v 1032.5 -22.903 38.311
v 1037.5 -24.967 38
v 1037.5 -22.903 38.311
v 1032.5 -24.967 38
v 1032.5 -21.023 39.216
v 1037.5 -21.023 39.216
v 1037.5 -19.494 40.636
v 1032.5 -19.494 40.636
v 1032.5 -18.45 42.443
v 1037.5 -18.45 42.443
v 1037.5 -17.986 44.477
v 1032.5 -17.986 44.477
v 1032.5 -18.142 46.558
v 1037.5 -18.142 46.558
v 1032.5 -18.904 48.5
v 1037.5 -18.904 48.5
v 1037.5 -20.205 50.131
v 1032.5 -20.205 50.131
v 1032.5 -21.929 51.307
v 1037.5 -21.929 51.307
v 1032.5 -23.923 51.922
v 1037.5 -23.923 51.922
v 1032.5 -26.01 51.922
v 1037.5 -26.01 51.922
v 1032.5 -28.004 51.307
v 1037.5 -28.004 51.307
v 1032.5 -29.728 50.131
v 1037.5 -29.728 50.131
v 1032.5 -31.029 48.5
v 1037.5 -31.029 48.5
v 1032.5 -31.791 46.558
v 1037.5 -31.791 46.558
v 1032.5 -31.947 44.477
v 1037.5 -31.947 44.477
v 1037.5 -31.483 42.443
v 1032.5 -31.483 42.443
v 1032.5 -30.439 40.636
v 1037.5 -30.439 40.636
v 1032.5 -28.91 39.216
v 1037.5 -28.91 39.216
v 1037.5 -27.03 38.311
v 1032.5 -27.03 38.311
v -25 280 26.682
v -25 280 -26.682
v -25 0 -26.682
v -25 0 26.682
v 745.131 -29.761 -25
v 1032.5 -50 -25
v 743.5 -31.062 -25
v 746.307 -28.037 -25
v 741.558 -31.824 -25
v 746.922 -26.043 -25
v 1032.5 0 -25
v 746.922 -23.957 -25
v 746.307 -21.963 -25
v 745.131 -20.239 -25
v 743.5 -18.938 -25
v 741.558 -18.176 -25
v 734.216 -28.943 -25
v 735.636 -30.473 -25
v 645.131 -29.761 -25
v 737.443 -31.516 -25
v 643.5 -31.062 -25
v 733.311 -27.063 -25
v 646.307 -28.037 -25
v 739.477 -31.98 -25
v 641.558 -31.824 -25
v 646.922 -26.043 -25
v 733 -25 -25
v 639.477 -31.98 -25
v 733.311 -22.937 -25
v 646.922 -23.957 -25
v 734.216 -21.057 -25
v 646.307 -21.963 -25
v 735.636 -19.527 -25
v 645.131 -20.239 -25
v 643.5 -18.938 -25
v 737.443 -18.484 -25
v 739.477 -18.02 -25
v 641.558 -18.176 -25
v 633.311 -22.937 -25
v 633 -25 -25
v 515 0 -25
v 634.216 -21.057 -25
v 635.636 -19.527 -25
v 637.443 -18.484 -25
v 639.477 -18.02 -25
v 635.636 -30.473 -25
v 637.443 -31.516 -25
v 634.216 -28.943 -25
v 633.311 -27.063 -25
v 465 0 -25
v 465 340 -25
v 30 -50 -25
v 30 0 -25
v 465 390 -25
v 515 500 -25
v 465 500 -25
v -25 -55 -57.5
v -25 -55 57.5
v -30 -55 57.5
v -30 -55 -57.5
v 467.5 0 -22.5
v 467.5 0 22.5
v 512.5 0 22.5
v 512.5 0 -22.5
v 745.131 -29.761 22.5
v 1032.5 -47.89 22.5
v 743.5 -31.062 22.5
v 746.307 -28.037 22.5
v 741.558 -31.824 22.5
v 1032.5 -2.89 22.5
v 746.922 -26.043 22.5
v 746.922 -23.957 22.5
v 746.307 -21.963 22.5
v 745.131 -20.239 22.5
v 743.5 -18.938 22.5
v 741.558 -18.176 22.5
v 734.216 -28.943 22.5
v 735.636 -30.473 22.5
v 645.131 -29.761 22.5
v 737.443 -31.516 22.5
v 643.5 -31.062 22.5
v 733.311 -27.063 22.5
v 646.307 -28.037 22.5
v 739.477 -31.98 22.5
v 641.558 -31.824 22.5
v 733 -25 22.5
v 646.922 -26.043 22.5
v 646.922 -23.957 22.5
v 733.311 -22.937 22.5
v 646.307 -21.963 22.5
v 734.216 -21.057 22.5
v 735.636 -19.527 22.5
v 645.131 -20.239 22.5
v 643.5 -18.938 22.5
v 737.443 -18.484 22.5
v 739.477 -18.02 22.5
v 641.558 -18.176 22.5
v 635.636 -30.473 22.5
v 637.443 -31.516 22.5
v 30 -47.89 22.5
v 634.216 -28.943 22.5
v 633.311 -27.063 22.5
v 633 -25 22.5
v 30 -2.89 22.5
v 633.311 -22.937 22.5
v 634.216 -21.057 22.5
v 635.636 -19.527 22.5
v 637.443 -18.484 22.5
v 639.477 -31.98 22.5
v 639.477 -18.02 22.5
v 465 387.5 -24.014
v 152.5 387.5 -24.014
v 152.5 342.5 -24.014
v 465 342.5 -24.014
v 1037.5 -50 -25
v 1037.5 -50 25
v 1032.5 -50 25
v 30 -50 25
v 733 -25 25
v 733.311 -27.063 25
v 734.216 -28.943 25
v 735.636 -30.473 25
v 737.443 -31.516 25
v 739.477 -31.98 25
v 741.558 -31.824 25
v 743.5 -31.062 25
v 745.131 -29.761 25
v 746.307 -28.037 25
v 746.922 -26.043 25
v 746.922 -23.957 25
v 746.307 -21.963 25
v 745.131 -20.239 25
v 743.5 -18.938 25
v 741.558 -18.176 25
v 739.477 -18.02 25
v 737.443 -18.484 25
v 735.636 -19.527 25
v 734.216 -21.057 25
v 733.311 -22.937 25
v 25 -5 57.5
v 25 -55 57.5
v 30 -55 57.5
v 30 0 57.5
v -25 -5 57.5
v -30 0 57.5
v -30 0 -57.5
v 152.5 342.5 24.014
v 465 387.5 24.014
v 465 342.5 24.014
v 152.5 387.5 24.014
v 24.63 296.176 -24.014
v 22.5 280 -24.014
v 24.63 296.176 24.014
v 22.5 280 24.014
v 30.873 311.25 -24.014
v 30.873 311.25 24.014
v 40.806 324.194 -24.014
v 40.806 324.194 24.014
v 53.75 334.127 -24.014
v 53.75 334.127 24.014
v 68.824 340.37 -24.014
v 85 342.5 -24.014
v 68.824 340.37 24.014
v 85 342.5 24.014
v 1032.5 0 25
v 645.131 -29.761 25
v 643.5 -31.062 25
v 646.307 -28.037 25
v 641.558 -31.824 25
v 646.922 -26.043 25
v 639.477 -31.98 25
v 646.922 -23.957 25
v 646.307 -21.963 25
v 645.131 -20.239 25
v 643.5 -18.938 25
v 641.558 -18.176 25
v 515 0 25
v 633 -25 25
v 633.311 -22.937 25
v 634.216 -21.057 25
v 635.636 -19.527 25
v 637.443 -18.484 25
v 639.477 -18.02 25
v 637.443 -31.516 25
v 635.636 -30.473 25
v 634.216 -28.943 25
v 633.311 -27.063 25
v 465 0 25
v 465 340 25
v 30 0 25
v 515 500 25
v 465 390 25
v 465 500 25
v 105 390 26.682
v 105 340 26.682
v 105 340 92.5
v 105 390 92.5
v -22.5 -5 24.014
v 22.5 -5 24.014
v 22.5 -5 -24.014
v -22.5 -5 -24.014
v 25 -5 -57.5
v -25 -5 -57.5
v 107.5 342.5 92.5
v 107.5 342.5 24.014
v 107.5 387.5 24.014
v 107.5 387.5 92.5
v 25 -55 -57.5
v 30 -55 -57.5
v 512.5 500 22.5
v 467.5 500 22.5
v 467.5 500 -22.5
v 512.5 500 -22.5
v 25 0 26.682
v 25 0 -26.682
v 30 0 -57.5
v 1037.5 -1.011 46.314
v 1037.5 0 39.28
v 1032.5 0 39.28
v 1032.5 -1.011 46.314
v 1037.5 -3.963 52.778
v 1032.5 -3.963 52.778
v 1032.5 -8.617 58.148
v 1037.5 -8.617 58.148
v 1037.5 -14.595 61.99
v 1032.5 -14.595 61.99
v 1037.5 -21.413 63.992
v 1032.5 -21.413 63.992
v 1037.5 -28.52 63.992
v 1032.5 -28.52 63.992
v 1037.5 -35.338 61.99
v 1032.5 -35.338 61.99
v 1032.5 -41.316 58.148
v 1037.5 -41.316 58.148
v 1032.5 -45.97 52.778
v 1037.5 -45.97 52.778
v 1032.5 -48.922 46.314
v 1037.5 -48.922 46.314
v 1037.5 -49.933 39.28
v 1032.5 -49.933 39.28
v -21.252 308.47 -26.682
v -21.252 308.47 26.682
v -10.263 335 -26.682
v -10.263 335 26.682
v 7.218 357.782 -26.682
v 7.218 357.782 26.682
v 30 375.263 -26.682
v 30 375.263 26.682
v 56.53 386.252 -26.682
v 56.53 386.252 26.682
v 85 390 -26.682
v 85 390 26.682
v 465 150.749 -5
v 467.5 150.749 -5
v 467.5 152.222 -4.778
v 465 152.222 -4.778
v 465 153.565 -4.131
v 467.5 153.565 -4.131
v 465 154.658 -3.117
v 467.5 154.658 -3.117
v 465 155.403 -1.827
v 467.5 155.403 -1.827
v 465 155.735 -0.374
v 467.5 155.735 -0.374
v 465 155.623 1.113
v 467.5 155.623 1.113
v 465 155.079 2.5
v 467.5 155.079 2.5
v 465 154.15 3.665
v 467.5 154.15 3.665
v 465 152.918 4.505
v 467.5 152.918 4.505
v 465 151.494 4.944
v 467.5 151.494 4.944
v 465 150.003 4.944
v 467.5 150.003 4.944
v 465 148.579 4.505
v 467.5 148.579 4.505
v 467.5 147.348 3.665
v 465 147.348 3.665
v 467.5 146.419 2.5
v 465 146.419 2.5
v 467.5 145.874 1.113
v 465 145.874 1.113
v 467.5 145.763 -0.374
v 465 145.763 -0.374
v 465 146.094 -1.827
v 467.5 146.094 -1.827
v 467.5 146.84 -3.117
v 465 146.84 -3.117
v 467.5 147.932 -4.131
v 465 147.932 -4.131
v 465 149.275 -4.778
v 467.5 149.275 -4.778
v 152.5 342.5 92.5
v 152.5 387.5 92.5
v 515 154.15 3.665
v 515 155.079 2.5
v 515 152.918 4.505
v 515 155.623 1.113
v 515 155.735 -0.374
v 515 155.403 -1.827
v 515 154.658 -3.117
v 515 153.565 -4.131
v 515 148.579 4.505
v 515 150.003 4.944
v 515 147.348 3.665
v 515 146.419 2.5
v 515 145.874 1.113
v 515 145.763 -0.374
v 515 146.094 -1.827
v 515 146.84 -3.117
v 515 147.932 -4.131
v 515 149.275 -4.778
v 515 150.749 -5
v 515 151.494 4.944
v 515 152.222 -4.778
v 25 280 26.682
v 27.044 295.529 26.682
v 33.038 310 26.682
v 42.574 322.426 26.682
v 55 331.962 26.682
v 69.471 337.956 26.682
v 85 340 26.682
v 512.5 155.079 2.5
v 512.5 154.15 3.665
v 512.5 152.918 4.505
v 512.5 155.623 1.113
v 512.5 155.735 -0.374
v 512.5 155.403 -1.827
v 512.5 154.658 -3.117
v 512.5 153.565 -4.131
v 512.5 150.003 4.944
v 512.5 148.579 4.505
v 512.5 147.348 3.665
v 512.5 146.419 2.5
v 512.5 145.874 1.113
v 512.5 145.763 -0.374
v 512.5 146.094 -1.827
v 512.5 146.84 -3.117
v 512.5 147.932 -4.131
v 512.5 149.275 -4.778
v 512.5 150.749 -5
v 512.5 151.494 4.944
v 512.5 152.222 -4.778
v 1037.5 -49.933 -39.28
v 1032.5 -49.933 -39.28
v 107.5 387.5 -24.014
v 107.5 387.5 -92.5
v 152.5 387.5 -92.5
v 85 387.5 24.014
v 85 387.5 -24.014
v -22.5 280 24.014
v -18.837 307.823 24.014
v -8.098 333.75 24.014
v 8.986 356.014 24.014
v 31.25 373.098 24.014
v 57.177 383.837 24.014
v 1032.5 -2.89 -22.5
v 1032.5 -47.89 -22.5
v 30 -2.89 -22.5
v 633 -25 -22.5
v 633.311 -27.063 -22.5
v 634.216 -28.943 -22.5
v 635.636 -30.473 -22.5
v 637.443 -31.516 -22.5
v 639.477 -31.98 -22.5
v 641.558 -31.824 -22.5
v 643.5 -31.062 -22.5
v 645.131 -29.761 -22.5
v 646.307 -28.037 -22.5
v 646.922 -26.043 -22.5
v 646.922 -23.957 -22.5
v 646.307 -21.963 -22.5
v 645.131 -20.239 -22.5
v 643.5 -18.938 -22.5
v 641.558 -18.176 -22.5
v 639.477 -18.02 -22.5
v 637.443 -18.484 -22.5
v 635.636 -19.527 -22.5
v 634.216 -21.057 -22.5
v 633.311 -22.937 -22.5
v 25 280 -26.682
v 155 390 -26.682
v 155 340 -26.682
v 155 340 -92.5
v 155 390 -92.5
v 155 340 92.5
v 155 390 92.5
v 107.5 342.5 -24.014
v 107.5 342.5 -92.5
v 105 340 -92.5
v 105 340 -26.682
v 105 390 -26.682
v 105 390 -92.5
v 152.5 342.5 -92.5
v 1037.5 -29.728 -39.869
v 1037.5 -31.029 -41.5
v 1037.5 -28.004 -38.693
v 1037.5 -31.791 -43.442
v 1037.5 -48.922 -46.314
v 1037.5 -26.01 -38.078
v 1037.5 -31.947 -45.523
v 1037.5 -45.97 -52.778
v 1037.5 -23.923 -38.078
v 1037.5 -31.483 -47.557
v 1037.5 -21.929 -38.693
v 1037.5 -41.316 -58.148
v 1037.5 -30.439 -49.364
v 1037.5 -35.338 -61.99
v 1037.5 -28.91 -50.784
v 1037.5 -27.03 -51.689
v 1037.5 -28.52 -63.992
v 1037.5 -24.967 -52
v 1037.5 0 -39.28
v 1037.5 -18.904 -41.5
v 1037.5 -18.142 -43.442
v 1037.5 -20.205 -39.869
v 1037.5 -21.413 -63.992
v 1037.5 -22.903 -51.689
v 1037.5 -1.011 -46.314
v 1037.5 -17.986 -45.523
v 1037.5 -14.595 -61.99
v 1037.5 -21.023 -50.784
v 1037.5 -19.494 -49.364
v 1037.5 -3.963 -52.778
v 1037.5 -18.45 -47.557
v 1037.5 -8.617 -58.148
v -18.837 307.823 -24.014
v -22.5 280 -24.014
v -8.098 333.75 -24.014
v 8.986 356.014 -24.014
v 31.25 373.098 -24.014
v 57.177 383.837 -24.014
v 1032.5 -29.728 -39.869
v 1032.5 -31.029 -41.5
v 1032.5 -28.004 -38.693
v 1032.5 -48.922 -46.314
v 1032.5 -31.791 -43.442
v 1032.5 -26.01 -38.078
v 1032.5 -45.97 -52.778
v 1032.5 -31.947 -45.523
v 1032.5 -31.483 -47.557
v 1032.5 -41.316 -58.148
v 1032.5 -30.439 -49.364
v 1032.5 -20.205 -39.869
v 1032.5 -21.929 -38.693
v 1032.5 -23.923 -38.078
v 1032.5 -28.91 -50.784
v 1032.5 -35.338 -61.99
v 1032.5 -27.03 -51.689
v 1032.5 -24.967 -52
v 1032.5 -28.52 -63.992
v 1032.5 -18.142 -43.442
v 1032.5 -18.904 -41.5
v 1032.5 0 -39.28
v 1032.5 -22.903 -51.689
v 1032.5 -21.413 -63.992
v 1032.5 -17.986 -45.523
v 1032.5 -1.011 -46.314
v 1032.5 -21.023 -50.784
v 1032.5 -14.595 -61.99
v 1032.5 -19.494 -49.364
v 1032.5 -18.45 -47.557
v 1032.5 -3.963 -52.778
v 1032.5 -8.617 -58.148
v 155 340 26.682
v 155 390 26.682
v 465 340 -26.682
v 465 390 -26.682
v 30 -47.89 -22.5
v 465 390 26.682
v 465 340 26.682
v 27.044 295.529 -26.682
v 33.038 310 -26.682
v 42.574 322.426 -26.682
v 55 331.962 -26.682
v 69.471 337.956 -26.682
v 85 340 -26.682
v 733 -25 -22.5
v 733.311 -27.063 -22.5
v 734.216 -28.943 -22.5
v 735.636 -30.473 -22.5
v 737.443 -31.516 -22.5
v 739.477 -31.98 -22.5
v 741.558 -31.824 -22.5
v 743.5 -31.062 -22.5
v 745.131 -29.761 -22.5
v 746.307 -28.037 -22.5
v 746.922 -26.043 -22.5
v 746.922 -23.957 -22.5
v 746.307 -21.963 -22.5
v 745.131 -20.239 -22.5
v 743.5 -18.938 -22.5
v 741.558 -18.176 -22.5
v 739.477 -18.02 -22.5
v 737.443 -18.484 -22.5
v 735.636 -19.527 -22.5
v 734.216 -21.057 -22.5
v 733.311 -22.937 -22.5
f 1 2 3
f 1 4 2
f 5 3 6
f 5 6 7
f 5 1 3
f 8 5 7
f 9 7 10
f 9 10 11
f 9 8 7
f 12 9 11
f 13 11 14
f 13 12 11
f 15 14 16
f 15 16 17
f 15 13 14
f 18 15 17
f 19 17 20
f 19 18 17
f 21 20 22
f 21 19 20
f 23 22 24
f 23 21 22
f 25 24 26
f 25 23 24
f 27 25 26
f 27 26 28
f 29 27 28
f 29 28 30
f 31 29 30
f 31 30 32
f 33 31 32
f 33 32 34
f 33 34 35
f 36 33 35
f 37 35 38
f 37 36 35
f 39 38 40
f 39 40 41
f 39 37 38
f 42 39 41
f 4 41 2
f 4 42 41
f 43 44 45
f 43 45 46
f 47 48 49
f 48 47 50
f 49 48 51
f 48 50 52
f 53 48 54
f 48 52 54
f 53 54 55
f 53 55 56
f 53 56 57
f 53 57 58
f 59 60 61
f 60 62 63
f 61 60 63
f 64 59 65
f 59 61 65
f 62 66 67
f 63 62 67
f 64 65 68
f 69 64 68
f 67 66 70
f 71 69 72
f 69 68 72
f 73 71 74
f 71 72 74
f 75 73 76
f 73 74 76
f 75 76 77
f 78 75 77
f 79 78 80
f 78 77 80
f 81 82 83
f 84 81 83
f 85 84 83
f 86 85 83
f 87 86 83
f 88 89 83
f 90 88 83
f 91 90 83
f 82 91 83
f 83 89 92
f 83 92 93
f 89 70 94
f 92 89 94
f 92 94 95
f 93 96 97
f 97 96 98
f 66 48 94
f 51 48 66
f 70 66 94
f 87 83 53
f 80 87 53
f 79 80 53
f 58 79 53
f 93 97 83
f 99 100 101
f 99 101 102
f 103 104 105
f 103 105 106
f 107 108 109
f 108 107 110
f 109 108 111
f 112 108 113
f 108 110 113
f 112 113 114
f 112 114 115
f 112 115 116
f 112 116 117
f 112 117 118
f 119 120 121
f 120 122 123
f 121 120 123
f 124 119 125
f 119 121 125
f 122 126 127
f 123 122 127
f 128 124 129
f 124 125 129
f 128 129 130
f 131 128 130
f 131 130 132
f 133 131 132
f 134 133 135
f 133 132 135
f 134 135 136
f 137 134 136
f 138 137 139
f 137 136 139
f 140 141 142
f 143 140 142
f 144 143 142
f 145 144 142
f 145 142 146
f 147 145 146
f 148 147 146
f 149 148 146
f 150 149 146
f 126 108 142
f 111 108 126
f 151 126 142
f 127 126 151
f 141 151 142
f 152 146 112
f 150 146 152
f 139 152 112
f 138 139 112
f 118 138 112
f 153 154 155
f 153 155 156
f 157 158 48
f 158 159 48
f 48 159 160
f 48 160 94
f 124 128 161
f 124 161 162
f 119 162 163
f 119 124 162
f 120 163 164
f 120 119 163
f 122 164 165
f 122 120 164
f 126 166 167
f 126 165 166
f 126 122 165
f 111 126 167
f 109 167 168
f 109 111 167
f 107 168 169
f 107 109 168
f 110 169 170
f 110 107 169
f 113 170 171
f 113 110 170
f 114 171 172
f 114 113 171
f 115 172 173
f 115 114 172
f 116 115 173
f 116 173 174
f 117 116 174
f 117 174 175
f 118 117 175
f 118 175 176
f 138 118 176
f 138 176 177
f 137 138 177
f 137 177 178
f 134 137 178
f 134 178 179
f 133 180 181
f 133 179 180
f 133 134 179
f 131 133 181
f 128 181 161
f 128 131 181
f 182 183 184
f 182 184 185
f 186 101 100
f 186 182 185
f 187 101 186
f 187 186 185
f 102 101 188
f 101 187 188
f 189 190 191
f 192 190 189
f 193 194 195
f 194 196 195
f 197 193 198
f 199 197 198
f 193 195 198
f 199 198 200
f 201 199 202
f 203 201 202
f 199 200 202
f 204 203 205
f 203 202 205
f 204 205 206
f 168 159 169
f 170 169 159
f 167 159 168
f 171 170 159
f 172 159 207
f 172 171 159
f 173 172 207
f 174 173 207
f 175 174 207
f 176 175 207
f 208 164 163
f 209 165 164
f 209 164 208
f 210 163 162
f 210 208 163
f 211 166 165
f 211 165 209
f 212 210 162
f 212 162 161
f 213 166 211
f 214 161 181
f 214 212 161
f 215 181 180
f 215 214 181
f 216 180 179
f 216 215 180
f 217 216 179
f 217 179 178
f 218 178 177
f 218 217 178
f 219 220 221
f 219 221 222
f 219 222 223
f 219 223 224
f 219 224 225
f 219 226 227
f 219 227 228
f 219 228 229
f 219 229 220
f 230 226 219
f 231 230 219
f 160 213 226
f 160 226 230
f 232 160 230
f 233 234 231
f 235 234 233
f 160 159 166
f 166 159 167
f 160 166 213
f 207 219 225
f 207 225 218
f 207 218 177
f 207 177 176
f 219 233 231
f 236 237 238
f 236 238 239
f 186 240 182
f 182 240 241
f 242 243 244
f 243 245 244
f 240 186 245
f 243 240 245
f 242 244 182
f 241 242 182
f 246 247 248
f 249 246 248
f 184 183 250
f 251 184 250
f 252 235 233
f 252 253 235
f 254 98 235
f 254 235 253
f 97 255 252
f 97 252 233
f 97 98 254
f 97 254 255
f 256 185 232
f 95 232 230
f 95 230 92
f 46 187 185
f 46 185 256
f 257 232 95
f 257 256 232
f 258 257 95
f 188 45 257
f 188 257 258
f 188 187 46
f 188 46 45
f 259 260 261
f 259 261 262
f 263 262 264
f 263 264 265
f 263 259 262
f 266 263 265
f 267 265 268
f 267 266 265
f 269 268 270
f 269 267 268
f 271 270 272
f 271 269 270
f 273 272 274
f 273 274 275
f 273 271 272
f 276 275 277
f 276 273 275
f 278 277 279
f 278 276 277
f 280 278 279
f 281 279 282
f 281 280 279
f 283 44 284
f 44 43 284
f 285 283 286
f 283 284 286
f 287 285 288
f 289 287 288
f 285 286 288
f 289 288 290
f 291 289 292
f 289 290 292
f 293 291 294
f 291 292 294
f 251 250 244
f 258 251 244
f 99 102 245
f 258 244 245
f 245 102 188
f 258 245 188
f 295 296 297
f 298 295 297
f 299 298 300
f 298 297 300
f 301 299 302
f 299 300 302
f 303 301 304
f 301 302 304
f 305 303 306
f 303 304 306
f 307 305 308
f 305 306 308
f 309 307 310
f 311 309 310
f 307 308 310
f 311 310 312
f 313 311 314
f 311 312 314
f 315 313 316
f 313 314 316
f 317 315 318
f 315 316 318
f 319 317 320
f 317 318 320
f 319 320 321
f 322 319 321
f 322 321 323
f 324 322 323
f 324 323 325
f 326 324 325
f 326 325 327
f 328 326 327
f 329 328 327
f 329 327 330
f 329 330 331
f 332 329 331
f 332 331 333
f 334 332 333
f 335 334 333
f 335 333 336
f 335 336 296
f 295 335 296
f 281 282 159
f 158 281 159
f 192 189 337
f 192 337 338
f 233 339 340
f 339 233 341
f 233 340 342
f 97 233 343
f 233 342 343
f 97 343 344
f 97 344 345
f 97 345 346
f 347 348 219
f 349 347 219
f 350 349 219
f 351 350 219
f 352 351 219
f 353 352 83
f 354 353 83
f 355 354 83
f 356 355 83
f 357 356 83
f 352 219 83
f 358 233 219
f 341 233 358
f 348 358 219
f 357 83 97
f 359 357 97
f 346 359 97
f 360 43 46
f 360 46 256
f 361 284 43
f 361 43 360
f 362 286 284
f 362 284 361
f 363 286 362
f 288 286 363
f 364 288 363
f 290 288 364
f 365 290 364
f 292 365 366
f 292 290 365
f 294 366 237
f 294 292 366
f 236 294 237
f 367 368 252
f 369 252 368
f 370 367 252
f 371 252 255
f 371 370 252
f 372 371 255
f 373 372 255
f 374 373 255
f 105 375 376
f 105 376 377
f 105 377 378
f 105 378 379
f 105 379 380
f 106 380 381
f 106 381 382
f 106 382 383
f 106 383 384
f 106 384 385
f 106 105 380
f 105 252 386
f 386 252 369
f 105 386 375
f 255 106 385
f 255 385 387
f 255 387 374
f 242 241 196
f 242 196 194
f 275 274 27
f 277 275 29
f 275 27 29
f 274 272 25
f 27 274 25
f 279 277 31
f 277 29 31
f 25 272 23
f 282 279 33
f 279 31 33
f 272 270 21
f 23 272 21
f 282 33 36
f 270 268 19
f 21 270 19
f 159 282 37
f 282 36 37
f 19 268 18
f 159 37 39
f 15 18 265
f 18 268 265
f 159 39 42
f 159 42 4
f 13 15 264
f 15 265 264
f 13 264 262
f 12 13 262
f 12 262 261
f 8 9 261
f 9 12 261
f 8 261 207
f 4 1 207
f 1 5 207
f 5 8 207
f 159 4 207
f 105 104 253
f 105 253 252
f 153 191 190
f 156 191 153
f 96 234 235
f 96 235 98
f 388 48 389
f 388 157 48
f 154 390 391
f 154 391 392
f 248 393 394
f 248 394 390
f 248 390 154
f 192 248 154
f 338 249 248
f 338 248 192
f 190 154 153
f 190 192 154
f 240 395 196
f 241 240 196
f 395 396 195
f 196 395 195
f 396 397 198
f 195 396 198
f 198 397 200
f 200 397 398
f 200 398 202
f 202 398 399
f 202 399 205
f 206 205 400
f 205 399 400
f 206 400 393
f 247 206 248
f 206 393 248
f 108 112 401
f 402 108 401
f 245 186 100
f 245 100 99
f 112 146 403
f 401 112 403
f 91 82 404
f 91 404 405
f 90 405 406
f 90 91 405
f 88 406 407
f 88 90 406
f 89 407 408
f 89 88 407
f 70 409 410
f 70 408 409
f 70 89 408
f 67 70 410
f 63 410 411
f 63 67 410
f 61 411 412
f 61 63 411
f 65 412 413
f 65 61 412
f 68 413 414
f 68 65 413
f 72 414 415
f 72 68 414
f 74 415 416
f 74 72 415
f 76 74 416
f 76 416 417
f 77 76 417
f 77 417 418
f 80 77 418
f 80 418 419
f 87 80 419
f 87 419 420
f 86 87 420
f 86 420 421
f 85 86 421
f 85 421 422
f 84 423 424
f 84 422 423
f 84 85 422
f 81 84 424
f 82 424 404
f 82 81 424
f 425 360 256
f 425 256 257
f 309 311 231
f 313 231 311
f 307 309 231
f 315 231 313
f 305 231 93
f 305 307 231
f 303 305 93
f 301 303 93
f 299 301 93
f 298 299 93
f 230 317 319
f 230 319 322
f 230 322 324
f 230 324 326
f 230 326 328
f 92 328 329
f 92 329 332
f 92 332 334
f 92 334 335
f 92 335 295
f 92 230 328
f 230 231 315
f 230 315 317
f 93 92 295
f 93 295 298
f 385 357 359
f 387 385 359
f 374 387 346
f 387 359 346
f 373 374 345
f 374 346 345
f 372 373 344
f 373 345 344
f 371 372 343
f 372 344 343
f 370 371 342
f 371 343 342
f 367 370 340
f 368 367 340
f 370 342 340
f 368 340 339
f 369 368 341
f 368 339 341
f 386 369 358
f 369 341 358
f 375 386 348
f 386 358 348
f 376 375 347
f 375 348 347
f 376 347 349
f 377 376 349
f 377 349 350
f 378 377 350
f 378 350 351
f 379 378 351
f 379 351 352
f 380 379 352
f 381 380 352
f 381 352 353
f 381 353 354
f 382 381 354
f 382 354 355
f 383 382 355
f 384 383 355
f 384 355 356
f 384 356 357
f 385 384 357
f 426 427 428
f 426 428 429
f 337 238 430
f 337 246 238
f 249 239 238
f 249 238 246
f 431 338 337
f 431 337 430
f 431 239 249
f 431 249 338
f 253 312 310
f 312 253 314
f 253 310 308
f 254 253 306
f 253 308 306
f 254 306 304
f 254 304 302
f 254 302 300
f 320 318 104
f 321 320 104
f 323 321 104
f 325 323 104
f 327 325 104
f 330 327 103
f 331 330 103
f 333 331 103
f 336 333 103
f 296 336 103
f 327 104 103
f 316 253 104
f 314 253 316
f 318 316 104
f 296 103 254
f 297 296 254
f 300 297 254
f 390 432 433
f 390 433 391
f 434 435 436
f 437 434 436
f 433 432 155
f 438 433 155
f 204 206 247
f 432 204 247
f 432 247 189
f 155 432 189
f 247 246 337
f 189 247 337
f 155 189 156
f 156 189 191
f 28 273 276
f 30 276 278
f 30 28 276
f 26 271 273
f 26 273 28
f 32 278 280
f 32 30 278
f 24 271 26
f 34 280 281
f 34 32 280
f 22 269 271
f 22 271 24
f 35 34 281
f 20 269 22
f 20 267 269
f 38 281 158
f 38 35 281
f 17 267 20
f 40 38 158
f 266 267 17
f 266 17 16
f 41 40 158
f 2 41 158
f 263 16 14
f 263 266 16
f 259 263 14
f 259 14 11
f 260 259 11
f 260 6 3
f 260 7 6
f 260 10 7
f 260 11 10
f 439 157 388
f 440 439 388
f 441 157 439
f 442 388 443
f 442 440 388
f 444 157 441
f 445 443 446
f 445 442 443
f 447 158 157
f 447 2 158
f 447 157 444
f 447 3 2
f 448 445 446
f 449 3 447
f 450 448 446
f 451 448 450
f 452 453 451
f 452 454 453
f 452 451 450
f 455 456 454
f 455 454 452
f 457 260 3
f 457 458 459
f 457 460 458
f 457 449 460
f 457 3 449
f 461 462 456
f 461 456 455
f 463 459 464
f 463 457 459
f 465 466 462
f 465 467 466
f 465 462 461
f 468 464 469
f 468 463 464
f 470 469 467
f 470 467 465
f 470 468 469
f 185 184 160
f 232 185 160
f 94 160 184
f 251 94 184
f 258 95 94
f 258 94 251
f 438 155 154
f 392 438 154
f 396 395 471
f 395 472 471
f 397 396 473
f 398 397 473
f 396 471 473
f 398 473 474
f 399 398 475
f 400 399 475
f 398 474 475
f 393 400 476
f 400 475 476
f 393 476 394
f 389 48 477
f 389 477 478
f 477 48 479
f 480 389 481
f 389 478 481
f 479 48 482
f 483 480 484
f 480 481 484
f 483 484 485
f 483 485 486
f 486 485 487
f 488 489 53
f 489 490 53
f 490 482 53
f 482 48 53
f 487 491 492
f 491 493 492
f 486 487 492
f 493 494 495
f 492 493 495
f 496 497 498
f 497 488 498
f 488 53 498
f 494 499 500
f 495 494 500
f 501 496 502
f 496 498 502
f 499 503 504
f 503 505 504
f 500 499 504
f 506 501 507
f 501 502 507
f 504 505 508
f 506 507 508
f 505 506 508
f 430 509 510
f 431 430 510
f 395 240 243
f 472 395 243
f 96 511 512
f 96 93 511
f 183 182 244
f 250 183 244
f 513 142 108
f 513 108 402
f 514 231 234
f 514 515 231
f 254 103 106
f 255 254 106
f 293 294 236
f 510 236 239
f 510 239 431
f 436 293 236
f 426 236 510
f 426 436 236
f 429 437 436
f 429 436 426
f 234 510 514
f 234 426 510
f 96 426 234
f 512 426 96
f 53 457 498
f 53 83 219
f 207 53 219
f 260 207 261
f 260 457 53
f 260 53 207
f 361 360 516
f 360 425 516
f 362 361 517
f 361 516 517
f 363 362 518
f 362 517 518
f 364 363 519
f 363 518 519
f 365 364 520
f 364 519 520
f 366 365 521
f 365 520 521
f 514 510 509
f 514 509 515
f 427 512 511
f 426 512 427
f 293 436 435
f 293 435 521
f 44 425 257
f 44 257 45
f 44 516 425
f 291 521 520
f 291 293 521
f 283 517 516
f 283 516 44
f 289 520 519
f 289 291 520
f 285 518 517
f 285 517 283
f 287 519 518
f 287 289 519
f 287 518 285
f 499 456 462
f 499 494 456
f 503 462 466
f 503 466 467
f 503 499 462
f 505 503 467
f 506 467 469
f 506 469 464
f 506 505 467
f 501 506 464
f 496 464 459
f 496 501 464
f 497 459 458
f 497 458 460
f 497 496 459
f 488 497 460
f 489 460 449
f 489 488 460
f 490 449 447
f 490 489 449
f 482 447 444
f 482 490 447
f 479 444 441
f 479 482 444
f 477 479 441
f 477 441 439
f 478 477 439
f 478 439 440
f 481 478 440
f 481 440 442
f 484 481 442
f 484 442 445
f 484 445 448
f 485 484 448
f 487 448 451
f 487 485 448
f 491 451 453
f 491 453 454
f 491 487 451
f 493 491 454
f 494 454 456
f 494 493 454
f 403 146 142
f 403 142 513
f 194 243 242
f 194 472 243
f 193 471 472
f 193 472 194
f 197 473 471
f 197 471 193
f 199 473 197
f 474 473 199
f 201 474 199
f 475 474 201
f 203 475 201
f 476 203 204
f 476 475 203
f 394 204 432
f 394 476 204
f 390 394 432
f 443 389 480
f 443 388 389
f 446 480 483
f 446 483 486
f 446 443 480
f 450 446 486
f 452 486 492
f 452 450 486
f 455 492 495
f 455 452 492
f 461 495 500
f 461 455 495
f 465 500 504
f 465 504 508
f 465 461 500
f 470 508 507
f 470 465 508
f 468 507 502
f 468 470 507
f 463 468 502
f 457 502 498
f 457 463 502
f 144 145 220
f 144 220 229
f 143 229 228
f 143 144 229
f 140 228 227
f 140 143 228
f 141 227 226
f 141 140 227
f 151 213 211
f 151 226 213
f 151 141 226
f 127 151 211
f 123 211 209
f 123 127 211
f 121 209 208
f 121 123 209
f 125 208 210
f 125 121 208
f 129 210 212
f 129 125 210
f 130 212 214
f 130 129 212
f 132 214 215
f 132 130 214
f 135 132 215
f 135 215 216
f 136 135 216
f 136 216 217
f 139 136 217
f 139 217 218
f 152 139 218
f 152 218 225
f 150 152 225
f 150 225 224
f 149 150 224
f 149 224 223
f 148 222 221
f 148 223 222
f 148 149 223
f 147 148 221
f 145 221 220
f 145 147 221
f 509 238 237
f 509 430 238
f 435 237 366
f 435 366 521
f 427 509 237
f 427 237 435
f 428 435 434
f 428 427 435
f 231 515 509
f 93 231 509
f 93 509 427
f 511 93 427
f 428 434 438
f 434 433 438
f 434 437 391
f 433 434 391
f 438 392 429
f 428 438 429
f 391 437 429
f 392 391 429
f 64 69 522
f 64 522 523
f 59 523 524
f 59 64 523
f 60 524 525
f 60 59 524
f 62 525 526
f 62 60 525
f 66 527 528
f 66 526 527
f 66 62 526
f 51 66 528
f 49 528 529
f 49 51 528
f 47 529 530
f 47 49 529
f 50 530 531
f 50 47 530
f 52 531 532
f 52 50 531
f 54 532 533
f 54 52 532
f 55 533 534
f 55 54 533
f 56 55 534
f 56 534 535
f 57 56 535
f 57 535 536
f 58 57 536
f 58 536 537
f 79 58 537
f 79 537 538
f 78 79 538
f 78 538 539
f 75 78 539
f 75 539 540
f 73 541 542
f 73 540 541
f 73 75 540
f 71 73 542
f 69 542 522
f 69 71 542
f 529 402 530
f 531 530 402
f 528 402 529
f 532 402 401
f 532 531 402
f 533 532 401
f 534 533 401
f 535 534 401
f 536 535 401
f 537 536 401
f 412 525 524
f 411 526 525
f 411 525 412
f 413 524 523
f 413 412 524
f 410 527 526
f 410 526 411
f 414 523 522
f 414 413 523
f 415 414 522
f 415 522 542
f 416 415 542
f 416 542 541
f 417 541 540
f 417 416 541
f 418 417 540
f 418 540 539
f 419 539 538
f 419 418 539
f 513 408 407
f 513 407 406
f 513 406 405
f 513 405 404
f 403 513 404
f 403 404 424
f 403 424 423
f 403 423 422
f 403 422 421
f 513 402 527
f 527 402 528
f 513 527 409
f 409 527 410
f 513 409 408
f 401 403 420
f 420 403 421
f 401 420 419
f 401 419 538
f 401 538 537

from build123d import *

# Parameters (mm, degrees)
SKETCH3_W               = 50
SKETCH3_H               = 53.36450452
SKETCH3_W_2             = 45
SKETCH3_H_2             = 48.028054068
SKETCH6_W               = 50
SKETCH6_H               = 50
SKETCH6_W_2             = 45
SKETCH6_H_2             = 45
BOSS_EXTRUDE1_DEPTH     = 67.5
SKETCH8_W               = 50
SKETCH8_H               = 50
SKETCH8_W_2             = 45
SKETCH8_H_2             = 45
BOSS_EXTRUDE2_DEPTH     = 500
CUT_EXTRUDE1_DEPTH      = 728.345344386
CUT_EXTRUDE1_DEPTH_BACK = 728.345344386
SKETCH9_W               = 45
SKETCH9_H               = 45
SKETCH12_W              = 60
SKETCH12_H              = 115
SKETCH12_W_2            = 45
SKETCH12_H_2            = 48.028054068
BOSS_EXTRUDE6_DEPTH     = 5
SKETCH14_W              = 115
SKETCH14_H              = 55
BOSS_EXTRUDE7_DEPTH     = 5
SKETCH15_W              = 50
SKETCH15_H              = 50
SKETCH15_W_2            = 45
SKETCH15_H_2            = 45
BOSS_EXTRUDE8_DEPTH     = 1005
CUT_EXTRUDE3_DEPTH      = 1156.435523948
CUT_EXTRUDE3_DEPTH_BACK = 1156.435523948
SKETCH18_R              = 7
SKETCH19_R              = 7
BOSS_EXTRUDE9_DEPTH     = 2.5
CUT_EXTRUDE4_REACH      = 747.373
SKETCH20_R              = 5


with BuildPart() as part:
    # Sweep1: sweep along a path in Sketch1
    with BuildLine(Plane.XY) as sweep1_path:
        Line((0, 0), (0, 280))
        ThreePointArc((0, 280), (24.895923599, 340.104076401), (85, 365))
        Line((85, 365), (465, 365))
    # Sketch3 → Sweep1 (sweep)
    with BuildSketch(Plane(origin=(0, 0, 0), x_dir=(1, 0, 0), z_dir=(0, 1, 0))):
        Rectangle(SKETCH3_W, SKETCH3_H)
        Rectangle(SKETCH3_W_2, SKETCH3_H_2, mode=Mode.SUBTRACT)
    sweep(path=sweep1_path.line)

    # Sketch6 → Boss-Extrude1 (add)
    with BuildSketch(Plane.XY.offset(-25)):
        with Locations((130, 365)):
            Rectangle(SKETCH6_W, SKETCH6_H)
        with Locations((130, 365)):
            Rectangle(SKETCH6_W_2, SKETCH6_H_2, mode=Mode.SUBTRACT)
    boss_extrude1 = extrude(amount=-BOSS_EXTRUDE1_DEPTH)

    # Mirror1: Boss-Extrude1 across plane
    add(boss_extrude1.mirror(Plane.XY))

    # Sketch8 → Boss-Extrude2 (add)
    with BuildSketch(Plane(origin=(0, 0, 0), x_dir=(1, 0, 0), z_dir=(0, 1, 0))):
        with Locations((490, 0)):
            Rectangle(SKETCH8_W, SKETCH8_H)
        with Locations((490, 0)):
            Rectangle(SKETCH8_W_2, SKETCH8_H_2, mode=Mode.SUBTRACT)
    extrude(amount=BOSS_EXTRUDE2_DEPTH)

    # Sketch9 → Cut-Extrude1 (cut, two sides: drawn at the far end of the back side and taken through both)
    with BuildSketch(Plane.XY.offset(25).offset(-CUT_EXTRUDE1_DEPTH_BACK)):
        with Locations((130, 365)):
            Rectangle(SKETCH9_W, SKETCH9_H)
    extrude(amount=CUT_EXTRUDE1_DEPTH + CUT_EXTRUDE1_DEPTH_BACK, mode=Mode.SUBTRACT)

    # Sketch12 → Boss-Extrude6 (add)
    with BuildSketch(Plane(origin=(0, 0, 0), x_dir=(1, 0, 0), z_dir=(0, 1, 0))):
        Rectangle(SKETCH12_W, SKETCH12_H)
        Rectangle(SKETCH12_W_2, SKETCH12_H_2, mode=Mode.SUBTRACT)
    extrude(amount=-BOSS_EXTRUDE6_DEPTH)

    # Sketch14 → Boss-Extrude7 (add)
    with BuildSketch(Plane(origin=(-25, 0, 0), x_dir=(0, 0, -1), z_dir=(1, 0, 0))):
        with Locations((0, -27.5)):
            Rectangle(SKETCH14_W, SKETCH14_H)
    boss_extrude7 = extrude(amount=-BOSS_EXTRUDE7_DEPTH)

    # Mirror2: Boss-Extrude7 across plane
    add(boss_extrude7.mirror(Plane(origin=(0, 0, 0), x_dir=(0, 0, 1), z_dir=(1, 0, 0))))

    # Sketch15 → Boss-Extrude8 (add)
    with BuildSketch(Plane(origin=(30, 0, 0), x_dir=(0, 0, -1), z_dir=(1, 0, 0))):
        with Locations((0, -25)):
            Rectangle(SKETCH15_W, SKETCH15_H)
        with Locations((0, -25.38965636)):
            Rectangle(SKETCH15_W_2, SKETCH15_H_2, mode=Mode.SUBTRACT)
    extrude(amount=BOSS_EXTRUDE8_DEPTH)

    # Sketch18 → Cut-Extrude3 (cut, two sides: drawn at the far end of the back side and taken through both)
    with BuildSketch(Plane.XY.offset(25).offset(-CUT_EXTRUDE3_DEPTH_BACK)):
        with Locations(Location((640, -25, 0), (0, 0, 180))):
            Circle(SKETCH18_R)
        with Locations(Location((740, -25, 0), (0, 0, 180))):
            Circle(SKETCH18_R)
    extrude(amount=CUT_EXTRUDE3_DEPTH + CUT_EXTRUDE3_DEPTH_BACK, mode=Mode.SUBTRACT)

    # Sketch19 → Boss-Extrude9 (add, symmetric)
    # profile 1 of 2: a face of its own
    with BuildSketch(Plane(origin=(1035, 0, 0), x_dir=(0, 0, -1), z_dir=(1, 0, 0))):
        with BuildLine():
            Line((25, -50), (25, 0))
            Line((25, 0), (-25, 0))
            Line((-25, 0), (-26.68225226, 0))
            Line((-26.68225226, 0), (-39.279697572, 0))
            ThreePointArc((-39.279697572, 0), (-64.246269333, -24.966571761), (-39.279697572, -49.933143522))
            Line((-39.279697572, -49.933143522), (-25, -50))
            Line((-25, -50), (25, -50))
        make_face()
        with Locations((-45, -24.966571761)):
            Circle(SKETCH19_R, mode=Mode.SUBTRACT)
    # profile 2 of 2: a face of its own
    with BuildSketch(Plane(origin=(1035, 0, 0), x_dir=(0, 0, -1), z_dir=(1, 0, 0))):
        with BuildLine():
            Line((26.420207217, 0), (25, 0))
            Line((25, 0), (25, -50))
            Line((25, -50), (39.279697572, -49.933143522))
            ThreePointArc((39.279697572, -49.933143522), (64.246269333, -24.966571761), (39.279697572, 0))
            Line((39.279697572, 0), (26.68225226, 0))
            Line((26.68225226, 0), (26.420207217, 0))
        make_face()
        with Locations((45, -24.966571761)):
            Circle(SKETCH19_R, mode=Mode.SUBTRACT)
    extrude(amount=BOSS_EXTRUDE9_DEPTH, both=True)

    # Cut-Extrude4: up to this face of the body (flat: up to its plane)
    cut_extrude4_end = Plane(part.part.faces().sort_by_distance((465, 170, 0))[0])
    # Sketch20 → Cut-Extrude4 (cut, up to the picked face)
    with BuildSketch(Plane(origin=(515, 0, 0), x_dir=(0, 0, -1), z_dir=(1, 0, 0)), mode=Mode.PRIVATE) as cut_extrude4_sk1:
        with Locations((0, 150.748695463)):
            Circle(SKETCH20_R)
    cut_extrude4_tool1 = split(extrude(cut_extrude4_sk1.sketch, amount=-CUT_EXTRUDE4_REACH, mode=Mode.PRIVATE), bisect_by=cut_extrude4_end, keep=Keep.BOTH, mode=Mode.PRIVATE)
    add(cut_extrude4_tool1.solids().sort_by(Axis((515, 150.748695, 0), (-1, 0, 0)))[0], mode=Mode.SUBTRACT)


solid = part.part
